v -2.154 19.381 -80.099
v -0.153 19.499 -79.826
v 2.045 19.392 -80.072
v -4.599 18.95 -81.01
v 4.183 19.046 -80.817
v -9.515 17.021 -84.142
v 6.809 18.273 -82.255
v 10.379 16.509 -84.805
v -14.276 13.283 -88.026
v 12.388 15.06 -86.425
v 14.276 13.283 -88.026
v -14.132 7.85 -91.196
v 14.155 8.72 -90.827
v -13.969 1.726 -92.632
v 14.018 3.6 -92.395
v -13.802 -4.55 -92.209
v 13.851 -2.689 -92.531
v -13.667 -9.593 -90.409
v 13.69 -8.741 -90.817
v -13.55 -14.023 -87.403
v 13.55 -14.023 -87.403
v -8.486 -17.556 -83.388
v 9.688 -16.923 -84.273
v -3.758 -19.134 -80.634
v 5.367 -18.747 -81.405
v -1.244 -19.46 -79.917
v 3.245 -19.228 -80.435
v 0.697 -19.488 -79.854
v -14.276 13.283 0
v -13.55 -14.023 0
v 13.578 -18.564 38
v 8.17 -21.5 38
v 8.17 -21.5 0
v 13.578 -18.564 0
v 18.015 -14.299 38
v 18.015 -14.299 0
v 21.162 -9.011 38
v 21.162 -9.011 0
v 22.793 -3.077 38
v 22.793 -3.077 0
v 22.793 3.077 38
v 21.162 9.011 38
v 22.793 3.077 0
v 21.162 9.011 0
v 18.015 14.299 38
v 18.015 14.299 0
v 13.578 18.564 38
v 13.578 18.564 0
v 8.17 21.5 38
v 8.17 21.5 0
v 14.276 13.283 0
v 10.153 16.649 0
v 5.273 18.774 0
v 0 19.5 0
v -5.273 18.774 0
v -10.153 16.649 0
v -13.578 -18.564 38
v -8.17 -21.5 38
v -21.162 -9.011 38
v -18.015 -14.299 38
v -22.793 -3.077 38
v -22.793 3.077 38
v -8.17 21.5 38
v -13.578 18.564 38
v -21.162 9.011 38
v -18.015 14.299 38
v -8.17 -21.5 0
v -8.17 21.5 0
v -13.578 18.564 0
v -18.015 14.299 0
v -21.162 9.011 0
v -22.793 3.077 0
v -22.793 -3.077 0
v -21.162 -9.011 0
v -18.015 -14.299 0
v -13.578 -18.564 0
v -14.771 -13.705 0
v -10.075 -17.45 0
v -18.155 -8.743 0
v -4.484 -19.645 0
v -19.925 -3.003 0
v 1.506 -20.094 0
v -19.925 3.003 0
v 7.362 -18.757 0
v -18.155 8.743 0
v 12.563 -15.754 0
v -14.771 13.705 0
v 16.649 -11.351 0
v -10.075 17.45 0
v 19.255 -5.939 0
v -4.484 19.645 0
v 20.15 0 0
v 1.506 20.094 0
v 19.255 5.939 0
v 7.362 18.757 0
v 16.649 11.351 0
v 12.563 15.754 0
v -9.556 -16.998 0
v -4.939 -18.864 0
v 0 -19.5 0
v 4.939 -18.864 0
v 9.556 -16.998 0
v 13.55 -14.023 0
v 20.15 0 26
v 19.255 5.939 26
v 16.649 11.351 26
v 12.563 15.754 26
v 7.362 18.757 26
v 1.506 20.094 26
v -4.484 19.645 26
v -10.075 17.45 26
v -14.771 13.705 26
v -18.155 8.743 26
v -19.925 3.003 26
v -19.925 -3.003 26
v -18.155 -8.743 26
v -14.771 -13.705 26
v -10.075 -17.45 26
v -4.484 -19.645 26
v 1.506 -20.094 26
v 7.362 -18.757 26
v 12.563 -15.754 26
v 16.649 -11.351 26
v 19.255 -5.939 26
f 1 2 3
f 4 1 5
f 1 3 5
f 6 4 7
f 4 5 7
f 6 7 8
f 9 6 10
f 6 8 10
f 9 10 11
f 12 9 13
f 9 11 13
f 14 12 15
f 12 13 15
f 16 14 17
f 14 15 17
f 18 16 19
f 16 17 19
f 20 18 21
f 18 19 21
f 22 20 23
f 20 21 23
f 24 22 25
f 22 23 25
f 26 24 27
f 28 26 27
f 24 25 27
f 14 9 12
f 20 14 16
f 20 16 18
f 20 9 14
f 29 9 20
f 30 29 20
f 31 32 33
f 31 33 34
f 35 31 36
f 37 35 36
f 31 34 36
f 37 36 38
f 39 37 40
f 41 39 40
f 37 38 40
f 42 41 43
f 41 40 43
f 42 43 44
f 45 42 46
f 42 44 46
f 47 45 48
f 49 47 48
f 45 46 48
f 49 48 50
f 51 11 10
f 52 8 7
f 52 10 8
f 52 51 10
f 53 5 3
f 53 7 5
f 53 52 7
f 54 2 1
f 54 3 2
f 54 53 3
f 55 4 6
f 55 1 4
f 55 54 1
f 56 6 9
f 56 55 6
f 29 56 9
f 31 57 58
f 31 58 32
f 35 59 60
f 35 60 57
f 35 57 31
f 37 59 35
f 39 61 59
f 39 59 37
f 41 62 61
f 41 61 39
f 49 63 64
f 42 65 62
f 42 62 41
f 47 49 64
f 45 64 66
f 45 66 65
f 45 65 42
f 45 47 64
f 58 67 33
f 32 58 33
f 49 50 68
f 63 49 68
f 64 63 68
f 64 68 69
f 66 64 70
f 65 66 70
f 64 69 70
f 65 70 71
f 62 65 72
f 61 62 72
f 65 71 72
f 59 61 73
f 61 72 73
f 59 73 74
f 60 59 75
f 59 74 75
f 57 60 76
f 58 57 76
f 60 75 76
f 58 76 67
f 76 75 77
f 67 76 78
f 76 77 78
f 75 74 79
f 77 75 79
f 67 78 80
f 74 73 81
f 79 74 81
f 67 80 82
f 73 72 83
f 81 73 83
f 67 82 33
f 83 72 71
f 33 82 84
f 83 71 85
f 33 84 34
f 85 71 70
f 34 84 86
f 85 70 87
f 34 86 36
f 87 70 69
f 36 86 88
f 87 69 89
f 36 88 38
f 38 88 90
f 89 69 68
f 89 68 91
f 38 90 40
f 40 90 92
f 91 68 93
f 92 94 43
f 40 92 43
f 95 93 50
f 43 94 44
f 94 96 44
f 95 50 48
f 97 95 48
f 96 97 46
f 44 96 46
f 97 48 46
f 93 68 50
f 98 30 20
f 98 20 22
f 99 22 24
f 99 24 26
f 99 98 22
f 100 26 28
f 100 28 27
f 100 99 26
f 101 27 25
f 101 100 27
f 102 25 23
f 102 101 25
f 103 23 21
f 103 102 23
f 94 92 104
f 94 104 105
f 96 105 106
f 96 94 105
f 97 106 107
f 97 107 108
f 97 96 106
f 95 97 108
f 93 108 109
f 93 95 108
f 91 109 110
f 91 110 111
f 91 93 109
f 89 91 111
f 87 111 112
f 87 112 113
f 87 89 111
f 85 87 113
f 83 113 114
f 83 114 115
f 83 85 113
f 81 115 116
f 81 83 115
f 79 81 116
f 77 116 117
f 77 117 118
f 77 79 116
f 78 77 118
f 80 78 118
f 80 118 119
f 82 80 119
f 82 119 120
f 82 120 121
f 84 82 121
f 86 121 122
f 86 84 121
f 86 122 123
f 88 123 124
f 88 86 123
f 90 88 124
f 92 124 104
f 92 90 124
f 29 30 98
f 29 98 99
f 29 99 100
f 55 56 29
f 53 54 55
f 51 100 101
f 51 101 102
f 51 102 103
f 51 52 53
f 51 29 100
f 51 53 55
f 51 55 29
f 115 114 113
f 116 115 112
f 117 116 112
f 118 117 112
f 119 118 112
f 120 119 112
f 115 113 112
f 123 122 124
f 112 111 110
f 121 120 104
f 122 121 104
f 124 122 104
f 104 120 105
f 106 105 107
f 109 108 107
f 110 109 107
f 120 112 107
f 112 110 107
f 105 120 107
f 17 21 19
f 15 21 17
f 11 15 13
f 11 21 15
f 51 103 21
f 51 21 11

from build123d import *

# Parameters (mm, degrees)
F1_DEPTH = 38
F2_R     = 20.15
F3_DEPTH = 26
F5_DEPTH = 93
F7_DEPTH = 23.001
F8_DEPTH = 23.001


with BuildPart() as f1:
    # F0 (on Top) → F1 (new body)
    with BuildSketch(Plane.XY):
        with BuildLine():
            Line((8.1700673192, 21.5), (-8.1700673192, 21.5))
            ThreePointArc((-8.1700673192, 21.5), (-23, 0), (-8.1700673192, -21.5))
            Line((-8.1700673192, -21.5), (8.1700673192, -21.5))
            ThreePointArc((8.1700673192, -21.5), (23, 0), (8.1700673192, 21.5))
        make_face()
    extrude(amount=F1_DEPTH)

    # F2 (on Top) → F3 (cut)
    with BuildSketch(Plane.XY):
        Circle(F2_R)
    extrude(amount=F3_DEPTH, mode=Mode.SUBTRACT)


with BuildPart() as f5:
    # F4 (on Top) → F5 (new body)
    with BuildSketch(Plane.XY):
        with BuildLine():
            Line((-14.2760678833, 13.2832182016), (-13.5496060668, -14.0234865649))
            ThreePointArc((-13.5496060668, -14.0234865649), (0, -19.5), (13.5496060668, -14.0234865649))
            Line((13.5496060668, -14.0234865649), (14.2760678833, 13.2832182016))
            ThreePointArc((14.2760678833, 13.2832182016), (0, 19.5), (-14.2760678833, 13.2832182016))
        make_face()
    extrude(amount=-F5_DEPTH)

    # F6 (on Right) → F7 (cut, through all)
    with BuildSketch(Plane.YZ):
        with BuildLine():
            ThreePointArc((19.8433508687, -78.9692136549), (-2.1788867895, -92.5902863585), (-20.9512559641, -74.7546274516))
            Line((-20.9512559641, -74.7546274516), (-32.2703706109, -102.1996662021))
            Line((-32.2703706109, -102.1996662021), (31.4053460393, -102.1996662021))
            Line((31.4053460393, -102.1996662021), (19.8433508687, -78.9692136549))
        make_face()
    extrude(amount=F7_DEPTH, mode=Mode.SUBTRACT)

    # F8 (cut, through all): a face of the model
    f8_faces = [f5.faces().sort_by_distance(p)[0] for p in [
        (0, 19.0883456394, -86.4122627957),
    ]]
    extrude(f8_faces, amount=-F8_DEPTH, mode=Mode.SUBTRACT)


solid = Compound([f1.part, f5.part])
